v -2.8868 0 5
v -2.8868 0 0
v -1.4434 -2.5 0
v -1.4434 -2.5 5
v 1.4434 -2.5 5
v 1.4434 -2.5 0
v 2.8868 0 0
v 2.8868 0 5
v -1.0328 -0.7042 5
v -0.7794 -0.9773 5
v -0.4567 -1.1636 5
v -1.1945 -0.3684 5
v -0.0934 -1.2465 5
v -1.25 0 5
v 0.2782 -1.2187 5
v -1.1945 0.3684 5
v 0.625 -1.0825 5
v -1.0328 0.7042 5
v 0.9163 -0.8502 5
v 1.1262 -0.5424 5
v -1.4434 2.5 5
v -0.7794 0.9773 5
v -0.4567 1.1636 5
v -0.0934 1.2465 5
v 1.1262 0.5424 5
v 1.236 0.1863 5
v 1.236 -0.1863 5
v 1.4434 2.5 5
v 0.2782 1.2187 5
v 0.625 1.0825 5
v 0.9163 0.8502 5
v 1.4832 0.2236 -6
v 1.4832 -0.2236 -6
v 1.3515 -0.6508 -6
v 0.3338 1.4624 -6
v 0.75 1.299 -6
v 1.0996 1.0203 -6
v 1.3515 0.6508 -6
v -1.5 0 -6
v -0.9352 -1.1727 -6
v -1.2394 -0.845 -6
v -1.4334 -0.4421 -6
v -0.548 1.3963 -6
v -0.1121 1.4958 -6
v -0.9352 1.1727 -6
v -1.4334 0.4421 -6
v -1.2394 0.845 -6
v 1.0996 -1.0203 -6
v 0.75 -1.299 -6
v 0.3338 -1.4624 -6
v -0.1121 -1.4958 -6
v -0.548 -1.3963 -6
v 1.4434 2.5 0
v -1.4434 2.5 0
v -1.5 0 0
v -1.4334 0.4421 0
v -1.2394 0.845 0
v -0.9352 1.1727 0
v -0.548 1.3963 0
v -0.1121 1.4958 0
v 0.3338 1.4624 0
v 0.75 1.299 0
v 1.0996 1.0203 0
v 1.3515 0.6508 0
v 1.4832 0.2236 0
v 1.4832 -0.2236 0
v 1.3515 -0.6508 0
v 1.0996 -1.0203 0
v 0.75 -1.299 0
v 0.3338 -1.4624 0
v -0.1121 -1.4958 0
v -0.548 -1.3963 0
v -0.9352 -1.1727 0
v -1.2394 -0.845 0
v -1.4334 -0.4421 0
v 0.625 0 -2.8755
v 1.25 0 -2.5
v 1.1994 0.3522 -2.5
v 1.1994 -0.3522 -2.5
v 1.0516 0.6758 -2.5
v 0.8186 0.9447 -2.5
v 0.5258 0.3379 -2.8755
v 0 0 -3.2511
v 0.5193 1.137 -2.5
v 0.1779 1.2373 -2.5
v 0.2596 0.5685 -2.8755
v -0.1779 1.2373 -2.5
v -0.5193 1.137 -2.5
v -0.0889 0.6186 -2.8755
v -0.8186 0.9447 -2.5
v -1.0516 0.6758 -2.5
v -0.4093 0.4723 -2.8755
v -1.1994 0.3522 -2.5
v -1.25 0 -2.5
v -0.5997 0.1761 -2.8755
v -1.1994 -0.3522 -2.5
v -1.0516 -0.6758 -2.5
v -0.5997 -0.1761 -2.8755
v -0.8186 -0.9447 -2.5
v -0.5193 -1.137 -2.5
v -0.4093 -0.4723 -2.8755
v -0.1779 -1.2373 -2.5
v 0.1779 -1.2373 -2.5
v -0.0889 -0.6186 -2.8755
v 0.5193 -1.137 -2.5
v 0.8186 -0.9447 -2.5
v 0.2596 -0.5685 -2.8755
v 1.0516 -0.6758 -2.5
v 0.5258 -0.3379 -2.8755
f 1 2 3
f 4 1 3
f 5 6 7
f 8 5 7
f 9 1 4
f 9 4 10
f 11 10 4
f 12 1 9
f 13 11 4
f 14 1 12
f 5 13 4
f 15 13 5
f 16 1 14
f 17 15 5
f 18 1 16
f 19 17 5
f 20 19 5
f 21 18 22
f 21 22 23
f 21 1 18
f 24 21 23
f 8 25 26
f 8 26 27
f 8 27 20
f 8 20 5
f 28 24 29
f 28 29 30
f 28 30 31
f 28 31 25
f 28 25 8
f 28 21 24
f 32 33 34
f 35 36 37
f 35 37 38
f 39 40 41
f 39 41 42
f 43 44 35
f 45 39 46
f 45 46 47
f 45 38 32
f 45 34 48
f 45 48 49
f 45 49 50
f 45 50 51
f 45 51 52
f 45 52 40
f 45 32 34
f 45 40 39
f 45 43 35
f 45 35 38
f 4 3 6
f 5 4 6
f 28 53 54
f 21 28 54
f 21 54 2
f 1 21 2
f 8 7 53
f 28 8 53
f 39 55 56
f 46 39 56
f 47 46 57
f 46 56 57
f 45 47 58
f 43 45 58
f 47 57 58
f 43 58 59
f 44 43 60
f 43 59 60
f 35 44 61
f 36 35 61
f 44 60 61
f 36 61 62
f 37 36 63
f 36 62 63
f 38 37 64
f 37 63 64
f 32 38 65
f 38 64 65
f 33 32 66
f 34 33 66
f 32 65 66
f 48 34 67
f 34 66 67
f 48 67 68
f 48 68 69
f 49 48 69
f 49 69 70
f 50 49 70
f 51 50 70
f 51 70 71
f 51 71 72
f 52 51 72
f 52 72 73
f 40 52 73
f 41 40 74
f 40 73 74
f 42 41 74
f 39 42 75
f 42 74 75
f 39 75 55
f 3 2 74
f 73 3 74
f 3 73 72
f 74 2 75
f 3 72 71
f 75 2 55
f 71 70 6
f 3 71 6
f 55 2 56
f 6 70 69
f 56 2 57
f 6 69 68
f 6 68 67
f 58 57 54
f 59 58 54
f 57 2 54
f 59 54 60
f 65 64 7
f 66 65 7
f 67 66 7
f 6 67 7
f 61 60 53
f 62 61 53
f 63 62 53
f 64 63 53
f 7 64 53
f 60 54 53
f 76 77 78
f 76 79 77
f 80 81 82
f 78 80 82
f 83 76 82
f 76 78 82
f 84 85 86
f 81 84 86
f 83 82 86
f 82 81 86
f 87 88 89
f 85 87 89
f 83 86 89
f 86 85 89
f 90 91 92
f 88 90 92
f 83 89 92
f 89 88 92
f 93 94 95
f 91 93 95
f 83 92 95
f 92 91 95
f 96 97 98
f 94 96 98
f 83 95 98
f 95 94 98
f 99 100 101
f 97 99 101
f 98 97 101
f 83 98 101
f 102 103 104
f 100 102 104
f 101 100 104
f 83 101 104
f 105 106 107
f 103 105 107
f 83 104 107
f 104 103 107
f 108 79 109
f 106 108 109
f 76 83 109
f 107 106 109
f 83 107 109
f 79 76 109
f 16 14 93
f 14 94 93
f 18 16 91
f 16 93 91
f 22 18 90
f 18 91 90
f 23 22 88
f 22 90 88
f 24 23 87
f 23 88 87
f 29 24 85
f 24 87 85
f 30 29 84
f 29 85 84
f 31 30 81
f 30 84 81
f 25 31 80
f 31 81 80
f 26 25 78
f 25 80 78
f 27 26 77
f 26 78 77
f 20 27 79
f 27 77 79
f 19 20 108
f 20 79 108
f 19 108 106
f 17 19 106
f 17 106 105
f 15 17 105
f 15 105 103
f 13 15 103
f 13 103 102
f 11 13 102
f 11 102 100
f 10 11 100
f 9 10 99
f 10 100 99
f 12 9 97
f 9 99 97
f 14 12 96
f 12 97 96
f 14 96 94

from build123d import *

# Parameters (mm, degrees)
EXTRUDE_1_DEPTH = 5
SKETCH_4_R      = 1.5
EXTRUDE_2_DEPTH = 6
M3X0_5_1_D      = 2.5
M3X0_5_1_DEPTH  = 7.5
M3X0_5_1_TIP    = 0.751075774


with BuildPart() as part:
    # 草圖1 → 填料-伸長1 (new body)
    with BuildSketch(Plane.XY):
        Polygon((-1.443375673, 2.5), (-2.886751346, 0), (-1.443375673, -2.5), (1.443375673, -2.5), (2.886751346, 0), (1.443375673, 2.5), align=None)
    extrude(amount=EXTRUDE_1_DEPTH)

    # 草圖4 → 填料-伸長2 (add)
    with BuildSketch(Plane(origin=(0, 0, 0), x_dir=(-1, 0, 0), z_dir=(0, 0, -1))):
        Circle(SKETCH_4_R)
    extrude(amount=EXTRUDE_2_DEPTH)

    # M3x0.5 螺紋孔1
    with Locations(Plane.XY.offset(5)):
        with Locations((0, 0)):
            Hole(M3X0_5_1_D / 2, depth=M3X0_5_1_DEPTH)
            with Locations((0, 0, -(M3X0_5_1_DEPTH + M3X0_5_1_TIP / 2))):  # 118° drill point
                Cone(0, M3X0_5_1_D / 2, M3X0_5_1_TIP, mode=Mode.SUBTRACT)


solid = part.part
